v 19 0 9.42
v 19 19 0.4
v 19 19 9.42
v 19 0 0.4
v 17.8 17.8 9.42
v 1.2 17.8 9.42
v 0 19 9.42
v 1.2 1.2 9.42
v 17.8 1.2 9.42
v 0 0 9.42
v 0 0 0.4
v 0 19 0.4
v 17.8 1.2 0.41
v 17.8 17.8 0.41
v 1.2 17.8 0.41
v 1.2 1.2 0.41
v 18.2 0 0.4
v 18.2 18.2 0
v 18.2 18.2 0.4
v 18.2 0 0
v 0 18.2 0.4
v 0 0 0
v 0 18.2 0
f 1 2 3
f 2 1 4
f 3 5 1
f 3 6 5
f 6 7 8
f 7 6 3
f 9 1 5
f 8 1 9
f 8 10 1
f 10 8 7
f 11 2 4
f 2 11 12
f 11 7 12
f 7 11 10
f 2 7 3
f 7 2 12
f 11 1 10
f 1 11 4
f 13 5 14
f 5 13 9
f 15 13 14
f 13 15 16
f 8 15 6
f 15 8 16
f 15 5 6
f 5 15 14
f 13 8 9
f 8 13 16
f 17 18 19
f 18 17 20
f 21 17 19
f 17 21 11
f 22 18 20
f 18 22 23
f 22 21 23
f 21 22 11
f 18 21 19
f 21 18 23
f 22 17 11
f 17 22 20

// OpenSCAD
// file: ../../Base/Boxes.scad
// Fischertechnik Box Foundation
// Pre-designed Boxes

use <Constants.scad>

include <PlacementOptions.scad>

box190Width = 190;
box190Depth = 130;
box130Width = 130;
box130Depth = 95;
boxUsageHeight = 33.9;
boxWallThickness = 2.4;
boxBaseThickness = 1.0;
boxWebWidth = 3.0;

// getBoxWallThickness()
// Gets the wall thickness of a Fischertechnik Box

function getBoxWallThickness() = boxWallThickness;

// Gets the usable height of a fischertechnik box
function getBoxUsageHeight() = boxUsageHeight;

// Gets the thickness of the Fischertechnik box base.
function getBoxBaseThickness() = boxBaseThickness;

// Gets the width of a box web
function getBoxWebWidth() = boxWebWidth;

// Gets the usable inner space of a Box 190 as an x/y-list
function getBox190Space() = [
    box190Width - 2*getBoxWallThickness(), 
    box190Depth - 2*getBoxWallThickness() ];

// Imports the Fischertechnik empty box 130x190 mm and places it at position 0,0
// 190x130 are the outer sizes, the inner space is slightly smaller. Use getBox190Space() to get the inner sizes.
// This module needs the STL file "Fischertechnik Box 130x190.stl" in the library path.
// The box is positioned that the usable inner space is at the 0,0,0 position. The

module Box190() {
    translate([-getBoxWallThickness(),-getBoxWallThickness(),-getBoxBaseThickness()])
        import("Fischertechnik Box 130x190.stl", convexity=3);
}

// Gets the usable inner space of a Box 130 as an x/y-list
function getBox130Space() = [
    box130Width - 2*getBoxWallThickness(), 
    box130Depth - 2*getBoxWallThickness() ];

// Imports the Fischertechnik empty box 95x130 mm and places it at position 0,0
// 190x130 are the outer sizes, the inner space is slightly smaller. Use getBox190Space() to get the inner sizes.
// This module needs the STL file "Fischertechnik Box 95x130.stl" in the library path.
// The box is positioned that the usable inner space is at the 0,0,0 position. The

module Box130() {
    translate([-getBoxWallThickness(),-getBoxWallThickness(),-getBoxBaseThickness()])
        import("Fischertechnik Box 95x130.stl", convexity=3);
}

// Creates a web at the specified box walls
// corner 0 = LowerLeft, 1 = UpperLeft, 2 = UpperRight, 3 = LowerRight
// side 0 = LeftOfCorner, 1 = RightOfCorner
// distance = Distance in mm from the corner
// box = inner width and depth of the box (default: Box 190)
// webWidth = length of the web (default is 3 mms)
// webThickness = thickness of the web (default is 1 mm)

module BoxWeb(corner, side, distance, box=getBox190Space(), webWidth=getBoxWebWidth(), webThickness=1.0) {
    sink = getBoxWallThickness()/2;

    width = (corner % 2 == 0) ? 
            (side == LeftOfCorner ? webWidth : webThickness) :
            (side == LeftOfCorner ? webThickness : webWidth);

    depth = (corner % 2 == 0) ? 
            (side == RightOfCorner ? webWidth : webThickness) :
            (side == RightOfCorner ? webThickness : webWidth);
    
    xDiff = corner == LowerLeft ? 
                (side == LeftOfCorner ? -sink : distance) :
            (corner == UpperLeft ?                
                (side == LeftOfCorner ? distance : -sink) :
            (corner == UpperRight ?
                (side == LeftOfCorner ? box.x-webWidth+sink : box.x-distance-webThickness) :
                (side == LeftOfCorner ? box.x-distance-webThickness: box.x-webWidth+sink)));

    yDiff = corner == LowerLeft ? 
                (side == RightOfCorner ? -sink : distance) :
            (corner == UpperLeft ?
                (side == RightOfCorner ? box.y-distance : box.y-webWidth+sink) :
            (corner == UpperRight ?
                (side == RightOfCorner ? box.y-webWidth+sink : box.y-distance) :
                (side == RightOfCorner ? distance : -sink)));
    
    translate([xDiff, yDiff, -getExcess()])
        cube([width, depth, boxUsageHeight + 2*getExcess()]);
}
// file: ../../Base/Rotation.scad
// Fischertechnik Box Foundation
// Geometry Helpers Rotation

include <PlacementOptions.scad>

// getRotatedSpace(space, rotation=NoRotation)
// Rotates the space dependent on the specified rotation

function getRotatedSpace(space, rotation=NoRotation) = [
    (rotation == Rotate90 || rotation == Rotate270) ? space.y : space.x,
    (rotation == Rotate90 || rotation == Rotate270) ? space.x : space.y
];

// Rotates the given space around the fixed left lower corner
// space = the space the children needs as width/depth list [width,depth]
// rotation = 0 Rotate0 degrees, 1 Rotate90 degrees, 2 Rotate180 degrees, 3 Rotate270 degrees (equivalent to -90)

module RotateFix(space, rotation=Rotate0) {
    dy = (rotation == Rotate0 || rotation == Rotate270) ? 0 :
        (rotation == Rotate90) ? space.x :
        space.y;
    dx = (rotation < Rotate180) ? 0 :
        (rotation == Rotate180) ? space.x :
        space.y;
    
    translate([dx, dy, 0])
        rotate([0, 0, rotations[rotation]])
            children();
}
// file: ../../Base/Alignment.scad
// Fischertechnik Box Foundation
// Geometry Helpers Alignment

include <PlacementOptions.scad>

// getAlignedX(elementWidth, spaceWidth, align=AlignRight, offset=0)
// Gets the aligned X offset of an element with the given
// width in the given space.
// elementWidth = The width of the element to positon
// spaceWidth = The space where the element should be aligned
// align = 0 AlignLeft, 1 AlignCenter, 2 AlignRight
// offset = an optional offset from the aligned position. When
// aligned left or centered, then positive values are in X direction.
// When aligned right then positive values are in negative X direction.

function getAlignedX(elementWidth, spaceWidth, align=AlignRight, offset=0) =
    (align == AlignLeft) ?
        offset :
        ((align == AlignCenter) ?
        (spaceWidth - elementWidth)/2 + offset :
        spaceWidth - offset - elementWidth);

// getAlignedY(elementDepth, spaceDepth, align=AlignTop, offset=0)
// Gets the aligned Y offset of an element with the given
// depth in the given space.
// elementDepth = The depth of the element to positon
// spaceDepth = The space where the element should be aligned
// align = 0 AlignBottom, 1 AlignCenter, 2 AlignTop
// offset = an optional offset from the aligned position. When
// aligned bottom or centered, then positive values are in Y direction.
// When aligned top then positive values are in negative Y direction.

function getAlignedY(elementDepth, spaceDepth, align=AlignTop, offset=0) =
    (align == AlignBottom) ?
        offset :
        ((align == AlignCenter) ?
        (spaceDepth - elementDepth)/2 + offset :
        spaceDepth - offset - elementDepth);
// file: ../../Base/PlacementOptions.scad
// Fischertechnik Box Foundation
// Placement Options

// Alignment
NoAlign = 0;
AlignLeft = 1;
AlignBottom = 2;
AlignCenter = 3;
AlignRight = 4;
AlignTop = 5;

// Element rotation degree steps
rotations = [0, -90, -180, -270];

// Rotation
NoRotation = 0;
Rotate0 = 0;
Rotate90 = 1;
Rotate180 = 2;
Rotate270 = 3;

// Docking (seen from above)
NoDock = -1;
DockLeft = 0;
DockTop = 1;
DockRight = 2;
DockCorner = 2;
DockBottom = 3;

// Web corners
LowerLeft = 0;
UpperLeft = 1;
UpperRight = 2;
LowerRight = 3;

// Web position relative to corner
LeftOfCorner = 0;
RightOfCorner = 1;
// file: ../../Base/Placement.scad
// Fischertechnik Box Foundation
// Geometry Helpers Placement

use <Constants.scad>
use <Alignment.scad>
use <Rotation.scad>
use <Boxes.scad>

include <PlacementOptions.scad>

// Place(x=0, y=0, elementSpace=[0,0], alignX=AlignLeft, alignY=AlignBottom, rotation=Rotate0, boxSpace=getBox190Space())
// Places the child at the specified position
// y = Y-Position. This is a relative position when an X aligment is specified.
// x = X-Position. This is a relative position when an Y aligment is specified.
// elementSpace = space of the element to be placed [x,y]
// alignX = -1=NoAlign, 0 AlignLeft, 1 AlignCenter, 3 AlignRight (elementSpace and boxSpace required!)
// alignY = -1=NoAlign, 2 AlignBottom, 1 AlignCenter, 4 AlignTop (elementSpace and boxSpace required!)
// rotation = 0 Rotate0 0 degrees, 1 Rotate90 90 degrees, 
// 2 Rotate180 180 degrees, 3 Rotate270 270 degrees (equivalent to -90)
// boxSpace = Inner space of the box where the placement occurs [x,y] - default is Box 190x130 inner space

module Place(x=0, y=0, elementSpace=[0,0], 
  alignX=AlignLeft, alignY=AlignBottom, 
  rotation=NoRotation, boxSpace=getBox190Space()) {

    module Position(x, y, space, rotation=Rotate0) {
        translate([x, y, 0])
            RotateFix(space, rotation)
                children();
    }

    space = getRotatedSpace(elementSpace, rotation);
    alignedX = getAlignedX(space.x, boxSpace.x, alignX, x);
    alignedY = getAlignedY(space.y, boxSpace.y, alignY, y);
    Position(alignedX, alignedY, elementSpace, rotation)
        children();
}

// Center(space=getBox130Space(), elementSpace=[0,0])
// space = Space where the children is centered. For cylinder use centered=true and no elementSpace.
// elementSpace = space of the element to be centered [x,y]

module Center(space=getBox190Space(), elementSpace=[0,0]) {
    translate([(space.x - elementSpace.x) / 2, (space.y - elementSpace.y) / 2])
        children(0);
}

// CenterHorizontal(width=0, y=0, offset=0, space=getBox130Space())
// space = Space where the children is centered. For cylinder use centered=true and no elementSpace.
// elementSpace = space of the element to be centered [x,y]

module CenterHorizontal(width=0, y=0, offset=0, space=getBox190Space()) {
    translate([(space.x - width) / 2 + offset, y])
        children(0);
}

// CenterVertical(depth=0, x=0, offset=0, space=getBox130Space())
// space = Space where the children is centered. For cylinder use centered=true and no elementSpace.
// elementSpace = space of the element to be centered [x,y]

module CenterVertical(depth=0, x=0, offset=0, space=getBox190Space()) {
    translate([x, (space.y - depth) / 2 + offset])
        children(0);
}
// file: ../../Elements/AxisClip10.scad
// Fischertechnik Box Library
// Axis for clip 10
// 31023

use <../ModelBase/Simple.scad>

width = 12;
depth = 12;
height = 23;

// getAxisClip10Space()
// Gets the space of a frame for a clip 10 with spring ring (mot2)

function getAxisClip10Space() = [width, depth, height];

// AxisClip10()
// Axis for clip 10 with spring ring (mot2)

module AxisClip10() {
    LeveledAxisWithSpace(height, height-10, getAxisClip10Space());
}

// Tests
color("lightgray")
AxisClip10();
// file: ../../Base/Constants.scad
// Fischertechnik Box Foundation
// Constants

// Constant values necessary for multiple elements

// Base constants
dividerThickness = 1.2;
excess = 0.01;
fragments = 90;
tolerance = 0.8;

// Gets the thickness of a divider 
function getDividerThickness() = dividerThickness;

// Gets the excess that is used to merge walls into each other
function getExcess() = excess;

// Gets amount of fragments of a cylinder
function getFragments() = fragments;

// Gets the inner tolerance of a frame to each side
function getTolerance() = tolerance;


// Fischertechnik specific constants
axisDiameter = 4;
axisBottomDiameter = axisDiameter + 1;
standardEdgeDistance = 2.5;
standardWebDistance = 11.5;
standardCornerLength = 15;
tubeWallFactor = 0.8;

// Gets axis diameter
function getAxisDiameter() = axisDiameter;

// Gets axis bottom diameter for thicker part at the bottom
function getAxisBottomDiameter() = axisBottomDiameter;

// gets the standard distance to the wall of the box for dockable frames with webs
function getStandardEdgeDistance() = standardEdgeDistance;

// gets the standard distance of each web to the corner of the dockable frame
function getStandardWebDistance() = standardWebDistance;

// gets the standard length of the corner walls of a dockable frame
function getStandardCornerLength() = standardCornerLength;

// gets the wall thickness of a tube.
function getTubeWallThickness() = tubeWallFactor * getDividerThickness();
// file: ../../Elements/FrameAngleEquilateral.scad
// Fischertechnik Box Library
// Frame for equilateral angle blocks
// 31010

use <../Base/Constants.scad>
use <../ModelBase/Simple.scad>

width = 15;
depth = 15;
height = 9;

// getFrameAngleEquilateralSpace
// Gets the space the frame angle equilateral needs for count blocks as width and depth (.x and .y as a list)
// count = Count of equilateral angle blocks

function getFrameAngleEquilateralSpace(count=1) = getFrameOuterVolume([width * count, depth, height]);

// FrameAngleEquilateral(count)
// count = Count of angle blocks in x direction
// The walls of the frame are 9 mm high.
// The complete frame has a tolerance of addition 1 mm in each direction.

module FrameAngleEquilateral(count=1) {
    innerVolume = getFrameInnerVolume([width * count, depth, height]);
    Frame(innerVolume);
}

// Tests
color ("lightgray")
FrameAngleEquilateral();
// file: ../TestPrint.scad
// 3D Print Test Base

use <../Base/Constants.scad>

use <../Elements/AxisClip10.scad>

module TestPrint(elementSpace) {
    cube([elementSpace.x, elementSpace.y, 0.4]);
    translate([0,0,0.4+getExcess()]) {
        children();
    }
}

TestPrint(getAxisClip10Space())
    AxisClip10();
// main file
// 3D Print Test Base
// FrameAngleEquilateral

use <../TestPrint.scad>
use <../../Elements/FrameAngleEquilateral.scad>

TestPrint(getFrameAngleEquilateralSpace())
    FrameAngleEquilateral();
